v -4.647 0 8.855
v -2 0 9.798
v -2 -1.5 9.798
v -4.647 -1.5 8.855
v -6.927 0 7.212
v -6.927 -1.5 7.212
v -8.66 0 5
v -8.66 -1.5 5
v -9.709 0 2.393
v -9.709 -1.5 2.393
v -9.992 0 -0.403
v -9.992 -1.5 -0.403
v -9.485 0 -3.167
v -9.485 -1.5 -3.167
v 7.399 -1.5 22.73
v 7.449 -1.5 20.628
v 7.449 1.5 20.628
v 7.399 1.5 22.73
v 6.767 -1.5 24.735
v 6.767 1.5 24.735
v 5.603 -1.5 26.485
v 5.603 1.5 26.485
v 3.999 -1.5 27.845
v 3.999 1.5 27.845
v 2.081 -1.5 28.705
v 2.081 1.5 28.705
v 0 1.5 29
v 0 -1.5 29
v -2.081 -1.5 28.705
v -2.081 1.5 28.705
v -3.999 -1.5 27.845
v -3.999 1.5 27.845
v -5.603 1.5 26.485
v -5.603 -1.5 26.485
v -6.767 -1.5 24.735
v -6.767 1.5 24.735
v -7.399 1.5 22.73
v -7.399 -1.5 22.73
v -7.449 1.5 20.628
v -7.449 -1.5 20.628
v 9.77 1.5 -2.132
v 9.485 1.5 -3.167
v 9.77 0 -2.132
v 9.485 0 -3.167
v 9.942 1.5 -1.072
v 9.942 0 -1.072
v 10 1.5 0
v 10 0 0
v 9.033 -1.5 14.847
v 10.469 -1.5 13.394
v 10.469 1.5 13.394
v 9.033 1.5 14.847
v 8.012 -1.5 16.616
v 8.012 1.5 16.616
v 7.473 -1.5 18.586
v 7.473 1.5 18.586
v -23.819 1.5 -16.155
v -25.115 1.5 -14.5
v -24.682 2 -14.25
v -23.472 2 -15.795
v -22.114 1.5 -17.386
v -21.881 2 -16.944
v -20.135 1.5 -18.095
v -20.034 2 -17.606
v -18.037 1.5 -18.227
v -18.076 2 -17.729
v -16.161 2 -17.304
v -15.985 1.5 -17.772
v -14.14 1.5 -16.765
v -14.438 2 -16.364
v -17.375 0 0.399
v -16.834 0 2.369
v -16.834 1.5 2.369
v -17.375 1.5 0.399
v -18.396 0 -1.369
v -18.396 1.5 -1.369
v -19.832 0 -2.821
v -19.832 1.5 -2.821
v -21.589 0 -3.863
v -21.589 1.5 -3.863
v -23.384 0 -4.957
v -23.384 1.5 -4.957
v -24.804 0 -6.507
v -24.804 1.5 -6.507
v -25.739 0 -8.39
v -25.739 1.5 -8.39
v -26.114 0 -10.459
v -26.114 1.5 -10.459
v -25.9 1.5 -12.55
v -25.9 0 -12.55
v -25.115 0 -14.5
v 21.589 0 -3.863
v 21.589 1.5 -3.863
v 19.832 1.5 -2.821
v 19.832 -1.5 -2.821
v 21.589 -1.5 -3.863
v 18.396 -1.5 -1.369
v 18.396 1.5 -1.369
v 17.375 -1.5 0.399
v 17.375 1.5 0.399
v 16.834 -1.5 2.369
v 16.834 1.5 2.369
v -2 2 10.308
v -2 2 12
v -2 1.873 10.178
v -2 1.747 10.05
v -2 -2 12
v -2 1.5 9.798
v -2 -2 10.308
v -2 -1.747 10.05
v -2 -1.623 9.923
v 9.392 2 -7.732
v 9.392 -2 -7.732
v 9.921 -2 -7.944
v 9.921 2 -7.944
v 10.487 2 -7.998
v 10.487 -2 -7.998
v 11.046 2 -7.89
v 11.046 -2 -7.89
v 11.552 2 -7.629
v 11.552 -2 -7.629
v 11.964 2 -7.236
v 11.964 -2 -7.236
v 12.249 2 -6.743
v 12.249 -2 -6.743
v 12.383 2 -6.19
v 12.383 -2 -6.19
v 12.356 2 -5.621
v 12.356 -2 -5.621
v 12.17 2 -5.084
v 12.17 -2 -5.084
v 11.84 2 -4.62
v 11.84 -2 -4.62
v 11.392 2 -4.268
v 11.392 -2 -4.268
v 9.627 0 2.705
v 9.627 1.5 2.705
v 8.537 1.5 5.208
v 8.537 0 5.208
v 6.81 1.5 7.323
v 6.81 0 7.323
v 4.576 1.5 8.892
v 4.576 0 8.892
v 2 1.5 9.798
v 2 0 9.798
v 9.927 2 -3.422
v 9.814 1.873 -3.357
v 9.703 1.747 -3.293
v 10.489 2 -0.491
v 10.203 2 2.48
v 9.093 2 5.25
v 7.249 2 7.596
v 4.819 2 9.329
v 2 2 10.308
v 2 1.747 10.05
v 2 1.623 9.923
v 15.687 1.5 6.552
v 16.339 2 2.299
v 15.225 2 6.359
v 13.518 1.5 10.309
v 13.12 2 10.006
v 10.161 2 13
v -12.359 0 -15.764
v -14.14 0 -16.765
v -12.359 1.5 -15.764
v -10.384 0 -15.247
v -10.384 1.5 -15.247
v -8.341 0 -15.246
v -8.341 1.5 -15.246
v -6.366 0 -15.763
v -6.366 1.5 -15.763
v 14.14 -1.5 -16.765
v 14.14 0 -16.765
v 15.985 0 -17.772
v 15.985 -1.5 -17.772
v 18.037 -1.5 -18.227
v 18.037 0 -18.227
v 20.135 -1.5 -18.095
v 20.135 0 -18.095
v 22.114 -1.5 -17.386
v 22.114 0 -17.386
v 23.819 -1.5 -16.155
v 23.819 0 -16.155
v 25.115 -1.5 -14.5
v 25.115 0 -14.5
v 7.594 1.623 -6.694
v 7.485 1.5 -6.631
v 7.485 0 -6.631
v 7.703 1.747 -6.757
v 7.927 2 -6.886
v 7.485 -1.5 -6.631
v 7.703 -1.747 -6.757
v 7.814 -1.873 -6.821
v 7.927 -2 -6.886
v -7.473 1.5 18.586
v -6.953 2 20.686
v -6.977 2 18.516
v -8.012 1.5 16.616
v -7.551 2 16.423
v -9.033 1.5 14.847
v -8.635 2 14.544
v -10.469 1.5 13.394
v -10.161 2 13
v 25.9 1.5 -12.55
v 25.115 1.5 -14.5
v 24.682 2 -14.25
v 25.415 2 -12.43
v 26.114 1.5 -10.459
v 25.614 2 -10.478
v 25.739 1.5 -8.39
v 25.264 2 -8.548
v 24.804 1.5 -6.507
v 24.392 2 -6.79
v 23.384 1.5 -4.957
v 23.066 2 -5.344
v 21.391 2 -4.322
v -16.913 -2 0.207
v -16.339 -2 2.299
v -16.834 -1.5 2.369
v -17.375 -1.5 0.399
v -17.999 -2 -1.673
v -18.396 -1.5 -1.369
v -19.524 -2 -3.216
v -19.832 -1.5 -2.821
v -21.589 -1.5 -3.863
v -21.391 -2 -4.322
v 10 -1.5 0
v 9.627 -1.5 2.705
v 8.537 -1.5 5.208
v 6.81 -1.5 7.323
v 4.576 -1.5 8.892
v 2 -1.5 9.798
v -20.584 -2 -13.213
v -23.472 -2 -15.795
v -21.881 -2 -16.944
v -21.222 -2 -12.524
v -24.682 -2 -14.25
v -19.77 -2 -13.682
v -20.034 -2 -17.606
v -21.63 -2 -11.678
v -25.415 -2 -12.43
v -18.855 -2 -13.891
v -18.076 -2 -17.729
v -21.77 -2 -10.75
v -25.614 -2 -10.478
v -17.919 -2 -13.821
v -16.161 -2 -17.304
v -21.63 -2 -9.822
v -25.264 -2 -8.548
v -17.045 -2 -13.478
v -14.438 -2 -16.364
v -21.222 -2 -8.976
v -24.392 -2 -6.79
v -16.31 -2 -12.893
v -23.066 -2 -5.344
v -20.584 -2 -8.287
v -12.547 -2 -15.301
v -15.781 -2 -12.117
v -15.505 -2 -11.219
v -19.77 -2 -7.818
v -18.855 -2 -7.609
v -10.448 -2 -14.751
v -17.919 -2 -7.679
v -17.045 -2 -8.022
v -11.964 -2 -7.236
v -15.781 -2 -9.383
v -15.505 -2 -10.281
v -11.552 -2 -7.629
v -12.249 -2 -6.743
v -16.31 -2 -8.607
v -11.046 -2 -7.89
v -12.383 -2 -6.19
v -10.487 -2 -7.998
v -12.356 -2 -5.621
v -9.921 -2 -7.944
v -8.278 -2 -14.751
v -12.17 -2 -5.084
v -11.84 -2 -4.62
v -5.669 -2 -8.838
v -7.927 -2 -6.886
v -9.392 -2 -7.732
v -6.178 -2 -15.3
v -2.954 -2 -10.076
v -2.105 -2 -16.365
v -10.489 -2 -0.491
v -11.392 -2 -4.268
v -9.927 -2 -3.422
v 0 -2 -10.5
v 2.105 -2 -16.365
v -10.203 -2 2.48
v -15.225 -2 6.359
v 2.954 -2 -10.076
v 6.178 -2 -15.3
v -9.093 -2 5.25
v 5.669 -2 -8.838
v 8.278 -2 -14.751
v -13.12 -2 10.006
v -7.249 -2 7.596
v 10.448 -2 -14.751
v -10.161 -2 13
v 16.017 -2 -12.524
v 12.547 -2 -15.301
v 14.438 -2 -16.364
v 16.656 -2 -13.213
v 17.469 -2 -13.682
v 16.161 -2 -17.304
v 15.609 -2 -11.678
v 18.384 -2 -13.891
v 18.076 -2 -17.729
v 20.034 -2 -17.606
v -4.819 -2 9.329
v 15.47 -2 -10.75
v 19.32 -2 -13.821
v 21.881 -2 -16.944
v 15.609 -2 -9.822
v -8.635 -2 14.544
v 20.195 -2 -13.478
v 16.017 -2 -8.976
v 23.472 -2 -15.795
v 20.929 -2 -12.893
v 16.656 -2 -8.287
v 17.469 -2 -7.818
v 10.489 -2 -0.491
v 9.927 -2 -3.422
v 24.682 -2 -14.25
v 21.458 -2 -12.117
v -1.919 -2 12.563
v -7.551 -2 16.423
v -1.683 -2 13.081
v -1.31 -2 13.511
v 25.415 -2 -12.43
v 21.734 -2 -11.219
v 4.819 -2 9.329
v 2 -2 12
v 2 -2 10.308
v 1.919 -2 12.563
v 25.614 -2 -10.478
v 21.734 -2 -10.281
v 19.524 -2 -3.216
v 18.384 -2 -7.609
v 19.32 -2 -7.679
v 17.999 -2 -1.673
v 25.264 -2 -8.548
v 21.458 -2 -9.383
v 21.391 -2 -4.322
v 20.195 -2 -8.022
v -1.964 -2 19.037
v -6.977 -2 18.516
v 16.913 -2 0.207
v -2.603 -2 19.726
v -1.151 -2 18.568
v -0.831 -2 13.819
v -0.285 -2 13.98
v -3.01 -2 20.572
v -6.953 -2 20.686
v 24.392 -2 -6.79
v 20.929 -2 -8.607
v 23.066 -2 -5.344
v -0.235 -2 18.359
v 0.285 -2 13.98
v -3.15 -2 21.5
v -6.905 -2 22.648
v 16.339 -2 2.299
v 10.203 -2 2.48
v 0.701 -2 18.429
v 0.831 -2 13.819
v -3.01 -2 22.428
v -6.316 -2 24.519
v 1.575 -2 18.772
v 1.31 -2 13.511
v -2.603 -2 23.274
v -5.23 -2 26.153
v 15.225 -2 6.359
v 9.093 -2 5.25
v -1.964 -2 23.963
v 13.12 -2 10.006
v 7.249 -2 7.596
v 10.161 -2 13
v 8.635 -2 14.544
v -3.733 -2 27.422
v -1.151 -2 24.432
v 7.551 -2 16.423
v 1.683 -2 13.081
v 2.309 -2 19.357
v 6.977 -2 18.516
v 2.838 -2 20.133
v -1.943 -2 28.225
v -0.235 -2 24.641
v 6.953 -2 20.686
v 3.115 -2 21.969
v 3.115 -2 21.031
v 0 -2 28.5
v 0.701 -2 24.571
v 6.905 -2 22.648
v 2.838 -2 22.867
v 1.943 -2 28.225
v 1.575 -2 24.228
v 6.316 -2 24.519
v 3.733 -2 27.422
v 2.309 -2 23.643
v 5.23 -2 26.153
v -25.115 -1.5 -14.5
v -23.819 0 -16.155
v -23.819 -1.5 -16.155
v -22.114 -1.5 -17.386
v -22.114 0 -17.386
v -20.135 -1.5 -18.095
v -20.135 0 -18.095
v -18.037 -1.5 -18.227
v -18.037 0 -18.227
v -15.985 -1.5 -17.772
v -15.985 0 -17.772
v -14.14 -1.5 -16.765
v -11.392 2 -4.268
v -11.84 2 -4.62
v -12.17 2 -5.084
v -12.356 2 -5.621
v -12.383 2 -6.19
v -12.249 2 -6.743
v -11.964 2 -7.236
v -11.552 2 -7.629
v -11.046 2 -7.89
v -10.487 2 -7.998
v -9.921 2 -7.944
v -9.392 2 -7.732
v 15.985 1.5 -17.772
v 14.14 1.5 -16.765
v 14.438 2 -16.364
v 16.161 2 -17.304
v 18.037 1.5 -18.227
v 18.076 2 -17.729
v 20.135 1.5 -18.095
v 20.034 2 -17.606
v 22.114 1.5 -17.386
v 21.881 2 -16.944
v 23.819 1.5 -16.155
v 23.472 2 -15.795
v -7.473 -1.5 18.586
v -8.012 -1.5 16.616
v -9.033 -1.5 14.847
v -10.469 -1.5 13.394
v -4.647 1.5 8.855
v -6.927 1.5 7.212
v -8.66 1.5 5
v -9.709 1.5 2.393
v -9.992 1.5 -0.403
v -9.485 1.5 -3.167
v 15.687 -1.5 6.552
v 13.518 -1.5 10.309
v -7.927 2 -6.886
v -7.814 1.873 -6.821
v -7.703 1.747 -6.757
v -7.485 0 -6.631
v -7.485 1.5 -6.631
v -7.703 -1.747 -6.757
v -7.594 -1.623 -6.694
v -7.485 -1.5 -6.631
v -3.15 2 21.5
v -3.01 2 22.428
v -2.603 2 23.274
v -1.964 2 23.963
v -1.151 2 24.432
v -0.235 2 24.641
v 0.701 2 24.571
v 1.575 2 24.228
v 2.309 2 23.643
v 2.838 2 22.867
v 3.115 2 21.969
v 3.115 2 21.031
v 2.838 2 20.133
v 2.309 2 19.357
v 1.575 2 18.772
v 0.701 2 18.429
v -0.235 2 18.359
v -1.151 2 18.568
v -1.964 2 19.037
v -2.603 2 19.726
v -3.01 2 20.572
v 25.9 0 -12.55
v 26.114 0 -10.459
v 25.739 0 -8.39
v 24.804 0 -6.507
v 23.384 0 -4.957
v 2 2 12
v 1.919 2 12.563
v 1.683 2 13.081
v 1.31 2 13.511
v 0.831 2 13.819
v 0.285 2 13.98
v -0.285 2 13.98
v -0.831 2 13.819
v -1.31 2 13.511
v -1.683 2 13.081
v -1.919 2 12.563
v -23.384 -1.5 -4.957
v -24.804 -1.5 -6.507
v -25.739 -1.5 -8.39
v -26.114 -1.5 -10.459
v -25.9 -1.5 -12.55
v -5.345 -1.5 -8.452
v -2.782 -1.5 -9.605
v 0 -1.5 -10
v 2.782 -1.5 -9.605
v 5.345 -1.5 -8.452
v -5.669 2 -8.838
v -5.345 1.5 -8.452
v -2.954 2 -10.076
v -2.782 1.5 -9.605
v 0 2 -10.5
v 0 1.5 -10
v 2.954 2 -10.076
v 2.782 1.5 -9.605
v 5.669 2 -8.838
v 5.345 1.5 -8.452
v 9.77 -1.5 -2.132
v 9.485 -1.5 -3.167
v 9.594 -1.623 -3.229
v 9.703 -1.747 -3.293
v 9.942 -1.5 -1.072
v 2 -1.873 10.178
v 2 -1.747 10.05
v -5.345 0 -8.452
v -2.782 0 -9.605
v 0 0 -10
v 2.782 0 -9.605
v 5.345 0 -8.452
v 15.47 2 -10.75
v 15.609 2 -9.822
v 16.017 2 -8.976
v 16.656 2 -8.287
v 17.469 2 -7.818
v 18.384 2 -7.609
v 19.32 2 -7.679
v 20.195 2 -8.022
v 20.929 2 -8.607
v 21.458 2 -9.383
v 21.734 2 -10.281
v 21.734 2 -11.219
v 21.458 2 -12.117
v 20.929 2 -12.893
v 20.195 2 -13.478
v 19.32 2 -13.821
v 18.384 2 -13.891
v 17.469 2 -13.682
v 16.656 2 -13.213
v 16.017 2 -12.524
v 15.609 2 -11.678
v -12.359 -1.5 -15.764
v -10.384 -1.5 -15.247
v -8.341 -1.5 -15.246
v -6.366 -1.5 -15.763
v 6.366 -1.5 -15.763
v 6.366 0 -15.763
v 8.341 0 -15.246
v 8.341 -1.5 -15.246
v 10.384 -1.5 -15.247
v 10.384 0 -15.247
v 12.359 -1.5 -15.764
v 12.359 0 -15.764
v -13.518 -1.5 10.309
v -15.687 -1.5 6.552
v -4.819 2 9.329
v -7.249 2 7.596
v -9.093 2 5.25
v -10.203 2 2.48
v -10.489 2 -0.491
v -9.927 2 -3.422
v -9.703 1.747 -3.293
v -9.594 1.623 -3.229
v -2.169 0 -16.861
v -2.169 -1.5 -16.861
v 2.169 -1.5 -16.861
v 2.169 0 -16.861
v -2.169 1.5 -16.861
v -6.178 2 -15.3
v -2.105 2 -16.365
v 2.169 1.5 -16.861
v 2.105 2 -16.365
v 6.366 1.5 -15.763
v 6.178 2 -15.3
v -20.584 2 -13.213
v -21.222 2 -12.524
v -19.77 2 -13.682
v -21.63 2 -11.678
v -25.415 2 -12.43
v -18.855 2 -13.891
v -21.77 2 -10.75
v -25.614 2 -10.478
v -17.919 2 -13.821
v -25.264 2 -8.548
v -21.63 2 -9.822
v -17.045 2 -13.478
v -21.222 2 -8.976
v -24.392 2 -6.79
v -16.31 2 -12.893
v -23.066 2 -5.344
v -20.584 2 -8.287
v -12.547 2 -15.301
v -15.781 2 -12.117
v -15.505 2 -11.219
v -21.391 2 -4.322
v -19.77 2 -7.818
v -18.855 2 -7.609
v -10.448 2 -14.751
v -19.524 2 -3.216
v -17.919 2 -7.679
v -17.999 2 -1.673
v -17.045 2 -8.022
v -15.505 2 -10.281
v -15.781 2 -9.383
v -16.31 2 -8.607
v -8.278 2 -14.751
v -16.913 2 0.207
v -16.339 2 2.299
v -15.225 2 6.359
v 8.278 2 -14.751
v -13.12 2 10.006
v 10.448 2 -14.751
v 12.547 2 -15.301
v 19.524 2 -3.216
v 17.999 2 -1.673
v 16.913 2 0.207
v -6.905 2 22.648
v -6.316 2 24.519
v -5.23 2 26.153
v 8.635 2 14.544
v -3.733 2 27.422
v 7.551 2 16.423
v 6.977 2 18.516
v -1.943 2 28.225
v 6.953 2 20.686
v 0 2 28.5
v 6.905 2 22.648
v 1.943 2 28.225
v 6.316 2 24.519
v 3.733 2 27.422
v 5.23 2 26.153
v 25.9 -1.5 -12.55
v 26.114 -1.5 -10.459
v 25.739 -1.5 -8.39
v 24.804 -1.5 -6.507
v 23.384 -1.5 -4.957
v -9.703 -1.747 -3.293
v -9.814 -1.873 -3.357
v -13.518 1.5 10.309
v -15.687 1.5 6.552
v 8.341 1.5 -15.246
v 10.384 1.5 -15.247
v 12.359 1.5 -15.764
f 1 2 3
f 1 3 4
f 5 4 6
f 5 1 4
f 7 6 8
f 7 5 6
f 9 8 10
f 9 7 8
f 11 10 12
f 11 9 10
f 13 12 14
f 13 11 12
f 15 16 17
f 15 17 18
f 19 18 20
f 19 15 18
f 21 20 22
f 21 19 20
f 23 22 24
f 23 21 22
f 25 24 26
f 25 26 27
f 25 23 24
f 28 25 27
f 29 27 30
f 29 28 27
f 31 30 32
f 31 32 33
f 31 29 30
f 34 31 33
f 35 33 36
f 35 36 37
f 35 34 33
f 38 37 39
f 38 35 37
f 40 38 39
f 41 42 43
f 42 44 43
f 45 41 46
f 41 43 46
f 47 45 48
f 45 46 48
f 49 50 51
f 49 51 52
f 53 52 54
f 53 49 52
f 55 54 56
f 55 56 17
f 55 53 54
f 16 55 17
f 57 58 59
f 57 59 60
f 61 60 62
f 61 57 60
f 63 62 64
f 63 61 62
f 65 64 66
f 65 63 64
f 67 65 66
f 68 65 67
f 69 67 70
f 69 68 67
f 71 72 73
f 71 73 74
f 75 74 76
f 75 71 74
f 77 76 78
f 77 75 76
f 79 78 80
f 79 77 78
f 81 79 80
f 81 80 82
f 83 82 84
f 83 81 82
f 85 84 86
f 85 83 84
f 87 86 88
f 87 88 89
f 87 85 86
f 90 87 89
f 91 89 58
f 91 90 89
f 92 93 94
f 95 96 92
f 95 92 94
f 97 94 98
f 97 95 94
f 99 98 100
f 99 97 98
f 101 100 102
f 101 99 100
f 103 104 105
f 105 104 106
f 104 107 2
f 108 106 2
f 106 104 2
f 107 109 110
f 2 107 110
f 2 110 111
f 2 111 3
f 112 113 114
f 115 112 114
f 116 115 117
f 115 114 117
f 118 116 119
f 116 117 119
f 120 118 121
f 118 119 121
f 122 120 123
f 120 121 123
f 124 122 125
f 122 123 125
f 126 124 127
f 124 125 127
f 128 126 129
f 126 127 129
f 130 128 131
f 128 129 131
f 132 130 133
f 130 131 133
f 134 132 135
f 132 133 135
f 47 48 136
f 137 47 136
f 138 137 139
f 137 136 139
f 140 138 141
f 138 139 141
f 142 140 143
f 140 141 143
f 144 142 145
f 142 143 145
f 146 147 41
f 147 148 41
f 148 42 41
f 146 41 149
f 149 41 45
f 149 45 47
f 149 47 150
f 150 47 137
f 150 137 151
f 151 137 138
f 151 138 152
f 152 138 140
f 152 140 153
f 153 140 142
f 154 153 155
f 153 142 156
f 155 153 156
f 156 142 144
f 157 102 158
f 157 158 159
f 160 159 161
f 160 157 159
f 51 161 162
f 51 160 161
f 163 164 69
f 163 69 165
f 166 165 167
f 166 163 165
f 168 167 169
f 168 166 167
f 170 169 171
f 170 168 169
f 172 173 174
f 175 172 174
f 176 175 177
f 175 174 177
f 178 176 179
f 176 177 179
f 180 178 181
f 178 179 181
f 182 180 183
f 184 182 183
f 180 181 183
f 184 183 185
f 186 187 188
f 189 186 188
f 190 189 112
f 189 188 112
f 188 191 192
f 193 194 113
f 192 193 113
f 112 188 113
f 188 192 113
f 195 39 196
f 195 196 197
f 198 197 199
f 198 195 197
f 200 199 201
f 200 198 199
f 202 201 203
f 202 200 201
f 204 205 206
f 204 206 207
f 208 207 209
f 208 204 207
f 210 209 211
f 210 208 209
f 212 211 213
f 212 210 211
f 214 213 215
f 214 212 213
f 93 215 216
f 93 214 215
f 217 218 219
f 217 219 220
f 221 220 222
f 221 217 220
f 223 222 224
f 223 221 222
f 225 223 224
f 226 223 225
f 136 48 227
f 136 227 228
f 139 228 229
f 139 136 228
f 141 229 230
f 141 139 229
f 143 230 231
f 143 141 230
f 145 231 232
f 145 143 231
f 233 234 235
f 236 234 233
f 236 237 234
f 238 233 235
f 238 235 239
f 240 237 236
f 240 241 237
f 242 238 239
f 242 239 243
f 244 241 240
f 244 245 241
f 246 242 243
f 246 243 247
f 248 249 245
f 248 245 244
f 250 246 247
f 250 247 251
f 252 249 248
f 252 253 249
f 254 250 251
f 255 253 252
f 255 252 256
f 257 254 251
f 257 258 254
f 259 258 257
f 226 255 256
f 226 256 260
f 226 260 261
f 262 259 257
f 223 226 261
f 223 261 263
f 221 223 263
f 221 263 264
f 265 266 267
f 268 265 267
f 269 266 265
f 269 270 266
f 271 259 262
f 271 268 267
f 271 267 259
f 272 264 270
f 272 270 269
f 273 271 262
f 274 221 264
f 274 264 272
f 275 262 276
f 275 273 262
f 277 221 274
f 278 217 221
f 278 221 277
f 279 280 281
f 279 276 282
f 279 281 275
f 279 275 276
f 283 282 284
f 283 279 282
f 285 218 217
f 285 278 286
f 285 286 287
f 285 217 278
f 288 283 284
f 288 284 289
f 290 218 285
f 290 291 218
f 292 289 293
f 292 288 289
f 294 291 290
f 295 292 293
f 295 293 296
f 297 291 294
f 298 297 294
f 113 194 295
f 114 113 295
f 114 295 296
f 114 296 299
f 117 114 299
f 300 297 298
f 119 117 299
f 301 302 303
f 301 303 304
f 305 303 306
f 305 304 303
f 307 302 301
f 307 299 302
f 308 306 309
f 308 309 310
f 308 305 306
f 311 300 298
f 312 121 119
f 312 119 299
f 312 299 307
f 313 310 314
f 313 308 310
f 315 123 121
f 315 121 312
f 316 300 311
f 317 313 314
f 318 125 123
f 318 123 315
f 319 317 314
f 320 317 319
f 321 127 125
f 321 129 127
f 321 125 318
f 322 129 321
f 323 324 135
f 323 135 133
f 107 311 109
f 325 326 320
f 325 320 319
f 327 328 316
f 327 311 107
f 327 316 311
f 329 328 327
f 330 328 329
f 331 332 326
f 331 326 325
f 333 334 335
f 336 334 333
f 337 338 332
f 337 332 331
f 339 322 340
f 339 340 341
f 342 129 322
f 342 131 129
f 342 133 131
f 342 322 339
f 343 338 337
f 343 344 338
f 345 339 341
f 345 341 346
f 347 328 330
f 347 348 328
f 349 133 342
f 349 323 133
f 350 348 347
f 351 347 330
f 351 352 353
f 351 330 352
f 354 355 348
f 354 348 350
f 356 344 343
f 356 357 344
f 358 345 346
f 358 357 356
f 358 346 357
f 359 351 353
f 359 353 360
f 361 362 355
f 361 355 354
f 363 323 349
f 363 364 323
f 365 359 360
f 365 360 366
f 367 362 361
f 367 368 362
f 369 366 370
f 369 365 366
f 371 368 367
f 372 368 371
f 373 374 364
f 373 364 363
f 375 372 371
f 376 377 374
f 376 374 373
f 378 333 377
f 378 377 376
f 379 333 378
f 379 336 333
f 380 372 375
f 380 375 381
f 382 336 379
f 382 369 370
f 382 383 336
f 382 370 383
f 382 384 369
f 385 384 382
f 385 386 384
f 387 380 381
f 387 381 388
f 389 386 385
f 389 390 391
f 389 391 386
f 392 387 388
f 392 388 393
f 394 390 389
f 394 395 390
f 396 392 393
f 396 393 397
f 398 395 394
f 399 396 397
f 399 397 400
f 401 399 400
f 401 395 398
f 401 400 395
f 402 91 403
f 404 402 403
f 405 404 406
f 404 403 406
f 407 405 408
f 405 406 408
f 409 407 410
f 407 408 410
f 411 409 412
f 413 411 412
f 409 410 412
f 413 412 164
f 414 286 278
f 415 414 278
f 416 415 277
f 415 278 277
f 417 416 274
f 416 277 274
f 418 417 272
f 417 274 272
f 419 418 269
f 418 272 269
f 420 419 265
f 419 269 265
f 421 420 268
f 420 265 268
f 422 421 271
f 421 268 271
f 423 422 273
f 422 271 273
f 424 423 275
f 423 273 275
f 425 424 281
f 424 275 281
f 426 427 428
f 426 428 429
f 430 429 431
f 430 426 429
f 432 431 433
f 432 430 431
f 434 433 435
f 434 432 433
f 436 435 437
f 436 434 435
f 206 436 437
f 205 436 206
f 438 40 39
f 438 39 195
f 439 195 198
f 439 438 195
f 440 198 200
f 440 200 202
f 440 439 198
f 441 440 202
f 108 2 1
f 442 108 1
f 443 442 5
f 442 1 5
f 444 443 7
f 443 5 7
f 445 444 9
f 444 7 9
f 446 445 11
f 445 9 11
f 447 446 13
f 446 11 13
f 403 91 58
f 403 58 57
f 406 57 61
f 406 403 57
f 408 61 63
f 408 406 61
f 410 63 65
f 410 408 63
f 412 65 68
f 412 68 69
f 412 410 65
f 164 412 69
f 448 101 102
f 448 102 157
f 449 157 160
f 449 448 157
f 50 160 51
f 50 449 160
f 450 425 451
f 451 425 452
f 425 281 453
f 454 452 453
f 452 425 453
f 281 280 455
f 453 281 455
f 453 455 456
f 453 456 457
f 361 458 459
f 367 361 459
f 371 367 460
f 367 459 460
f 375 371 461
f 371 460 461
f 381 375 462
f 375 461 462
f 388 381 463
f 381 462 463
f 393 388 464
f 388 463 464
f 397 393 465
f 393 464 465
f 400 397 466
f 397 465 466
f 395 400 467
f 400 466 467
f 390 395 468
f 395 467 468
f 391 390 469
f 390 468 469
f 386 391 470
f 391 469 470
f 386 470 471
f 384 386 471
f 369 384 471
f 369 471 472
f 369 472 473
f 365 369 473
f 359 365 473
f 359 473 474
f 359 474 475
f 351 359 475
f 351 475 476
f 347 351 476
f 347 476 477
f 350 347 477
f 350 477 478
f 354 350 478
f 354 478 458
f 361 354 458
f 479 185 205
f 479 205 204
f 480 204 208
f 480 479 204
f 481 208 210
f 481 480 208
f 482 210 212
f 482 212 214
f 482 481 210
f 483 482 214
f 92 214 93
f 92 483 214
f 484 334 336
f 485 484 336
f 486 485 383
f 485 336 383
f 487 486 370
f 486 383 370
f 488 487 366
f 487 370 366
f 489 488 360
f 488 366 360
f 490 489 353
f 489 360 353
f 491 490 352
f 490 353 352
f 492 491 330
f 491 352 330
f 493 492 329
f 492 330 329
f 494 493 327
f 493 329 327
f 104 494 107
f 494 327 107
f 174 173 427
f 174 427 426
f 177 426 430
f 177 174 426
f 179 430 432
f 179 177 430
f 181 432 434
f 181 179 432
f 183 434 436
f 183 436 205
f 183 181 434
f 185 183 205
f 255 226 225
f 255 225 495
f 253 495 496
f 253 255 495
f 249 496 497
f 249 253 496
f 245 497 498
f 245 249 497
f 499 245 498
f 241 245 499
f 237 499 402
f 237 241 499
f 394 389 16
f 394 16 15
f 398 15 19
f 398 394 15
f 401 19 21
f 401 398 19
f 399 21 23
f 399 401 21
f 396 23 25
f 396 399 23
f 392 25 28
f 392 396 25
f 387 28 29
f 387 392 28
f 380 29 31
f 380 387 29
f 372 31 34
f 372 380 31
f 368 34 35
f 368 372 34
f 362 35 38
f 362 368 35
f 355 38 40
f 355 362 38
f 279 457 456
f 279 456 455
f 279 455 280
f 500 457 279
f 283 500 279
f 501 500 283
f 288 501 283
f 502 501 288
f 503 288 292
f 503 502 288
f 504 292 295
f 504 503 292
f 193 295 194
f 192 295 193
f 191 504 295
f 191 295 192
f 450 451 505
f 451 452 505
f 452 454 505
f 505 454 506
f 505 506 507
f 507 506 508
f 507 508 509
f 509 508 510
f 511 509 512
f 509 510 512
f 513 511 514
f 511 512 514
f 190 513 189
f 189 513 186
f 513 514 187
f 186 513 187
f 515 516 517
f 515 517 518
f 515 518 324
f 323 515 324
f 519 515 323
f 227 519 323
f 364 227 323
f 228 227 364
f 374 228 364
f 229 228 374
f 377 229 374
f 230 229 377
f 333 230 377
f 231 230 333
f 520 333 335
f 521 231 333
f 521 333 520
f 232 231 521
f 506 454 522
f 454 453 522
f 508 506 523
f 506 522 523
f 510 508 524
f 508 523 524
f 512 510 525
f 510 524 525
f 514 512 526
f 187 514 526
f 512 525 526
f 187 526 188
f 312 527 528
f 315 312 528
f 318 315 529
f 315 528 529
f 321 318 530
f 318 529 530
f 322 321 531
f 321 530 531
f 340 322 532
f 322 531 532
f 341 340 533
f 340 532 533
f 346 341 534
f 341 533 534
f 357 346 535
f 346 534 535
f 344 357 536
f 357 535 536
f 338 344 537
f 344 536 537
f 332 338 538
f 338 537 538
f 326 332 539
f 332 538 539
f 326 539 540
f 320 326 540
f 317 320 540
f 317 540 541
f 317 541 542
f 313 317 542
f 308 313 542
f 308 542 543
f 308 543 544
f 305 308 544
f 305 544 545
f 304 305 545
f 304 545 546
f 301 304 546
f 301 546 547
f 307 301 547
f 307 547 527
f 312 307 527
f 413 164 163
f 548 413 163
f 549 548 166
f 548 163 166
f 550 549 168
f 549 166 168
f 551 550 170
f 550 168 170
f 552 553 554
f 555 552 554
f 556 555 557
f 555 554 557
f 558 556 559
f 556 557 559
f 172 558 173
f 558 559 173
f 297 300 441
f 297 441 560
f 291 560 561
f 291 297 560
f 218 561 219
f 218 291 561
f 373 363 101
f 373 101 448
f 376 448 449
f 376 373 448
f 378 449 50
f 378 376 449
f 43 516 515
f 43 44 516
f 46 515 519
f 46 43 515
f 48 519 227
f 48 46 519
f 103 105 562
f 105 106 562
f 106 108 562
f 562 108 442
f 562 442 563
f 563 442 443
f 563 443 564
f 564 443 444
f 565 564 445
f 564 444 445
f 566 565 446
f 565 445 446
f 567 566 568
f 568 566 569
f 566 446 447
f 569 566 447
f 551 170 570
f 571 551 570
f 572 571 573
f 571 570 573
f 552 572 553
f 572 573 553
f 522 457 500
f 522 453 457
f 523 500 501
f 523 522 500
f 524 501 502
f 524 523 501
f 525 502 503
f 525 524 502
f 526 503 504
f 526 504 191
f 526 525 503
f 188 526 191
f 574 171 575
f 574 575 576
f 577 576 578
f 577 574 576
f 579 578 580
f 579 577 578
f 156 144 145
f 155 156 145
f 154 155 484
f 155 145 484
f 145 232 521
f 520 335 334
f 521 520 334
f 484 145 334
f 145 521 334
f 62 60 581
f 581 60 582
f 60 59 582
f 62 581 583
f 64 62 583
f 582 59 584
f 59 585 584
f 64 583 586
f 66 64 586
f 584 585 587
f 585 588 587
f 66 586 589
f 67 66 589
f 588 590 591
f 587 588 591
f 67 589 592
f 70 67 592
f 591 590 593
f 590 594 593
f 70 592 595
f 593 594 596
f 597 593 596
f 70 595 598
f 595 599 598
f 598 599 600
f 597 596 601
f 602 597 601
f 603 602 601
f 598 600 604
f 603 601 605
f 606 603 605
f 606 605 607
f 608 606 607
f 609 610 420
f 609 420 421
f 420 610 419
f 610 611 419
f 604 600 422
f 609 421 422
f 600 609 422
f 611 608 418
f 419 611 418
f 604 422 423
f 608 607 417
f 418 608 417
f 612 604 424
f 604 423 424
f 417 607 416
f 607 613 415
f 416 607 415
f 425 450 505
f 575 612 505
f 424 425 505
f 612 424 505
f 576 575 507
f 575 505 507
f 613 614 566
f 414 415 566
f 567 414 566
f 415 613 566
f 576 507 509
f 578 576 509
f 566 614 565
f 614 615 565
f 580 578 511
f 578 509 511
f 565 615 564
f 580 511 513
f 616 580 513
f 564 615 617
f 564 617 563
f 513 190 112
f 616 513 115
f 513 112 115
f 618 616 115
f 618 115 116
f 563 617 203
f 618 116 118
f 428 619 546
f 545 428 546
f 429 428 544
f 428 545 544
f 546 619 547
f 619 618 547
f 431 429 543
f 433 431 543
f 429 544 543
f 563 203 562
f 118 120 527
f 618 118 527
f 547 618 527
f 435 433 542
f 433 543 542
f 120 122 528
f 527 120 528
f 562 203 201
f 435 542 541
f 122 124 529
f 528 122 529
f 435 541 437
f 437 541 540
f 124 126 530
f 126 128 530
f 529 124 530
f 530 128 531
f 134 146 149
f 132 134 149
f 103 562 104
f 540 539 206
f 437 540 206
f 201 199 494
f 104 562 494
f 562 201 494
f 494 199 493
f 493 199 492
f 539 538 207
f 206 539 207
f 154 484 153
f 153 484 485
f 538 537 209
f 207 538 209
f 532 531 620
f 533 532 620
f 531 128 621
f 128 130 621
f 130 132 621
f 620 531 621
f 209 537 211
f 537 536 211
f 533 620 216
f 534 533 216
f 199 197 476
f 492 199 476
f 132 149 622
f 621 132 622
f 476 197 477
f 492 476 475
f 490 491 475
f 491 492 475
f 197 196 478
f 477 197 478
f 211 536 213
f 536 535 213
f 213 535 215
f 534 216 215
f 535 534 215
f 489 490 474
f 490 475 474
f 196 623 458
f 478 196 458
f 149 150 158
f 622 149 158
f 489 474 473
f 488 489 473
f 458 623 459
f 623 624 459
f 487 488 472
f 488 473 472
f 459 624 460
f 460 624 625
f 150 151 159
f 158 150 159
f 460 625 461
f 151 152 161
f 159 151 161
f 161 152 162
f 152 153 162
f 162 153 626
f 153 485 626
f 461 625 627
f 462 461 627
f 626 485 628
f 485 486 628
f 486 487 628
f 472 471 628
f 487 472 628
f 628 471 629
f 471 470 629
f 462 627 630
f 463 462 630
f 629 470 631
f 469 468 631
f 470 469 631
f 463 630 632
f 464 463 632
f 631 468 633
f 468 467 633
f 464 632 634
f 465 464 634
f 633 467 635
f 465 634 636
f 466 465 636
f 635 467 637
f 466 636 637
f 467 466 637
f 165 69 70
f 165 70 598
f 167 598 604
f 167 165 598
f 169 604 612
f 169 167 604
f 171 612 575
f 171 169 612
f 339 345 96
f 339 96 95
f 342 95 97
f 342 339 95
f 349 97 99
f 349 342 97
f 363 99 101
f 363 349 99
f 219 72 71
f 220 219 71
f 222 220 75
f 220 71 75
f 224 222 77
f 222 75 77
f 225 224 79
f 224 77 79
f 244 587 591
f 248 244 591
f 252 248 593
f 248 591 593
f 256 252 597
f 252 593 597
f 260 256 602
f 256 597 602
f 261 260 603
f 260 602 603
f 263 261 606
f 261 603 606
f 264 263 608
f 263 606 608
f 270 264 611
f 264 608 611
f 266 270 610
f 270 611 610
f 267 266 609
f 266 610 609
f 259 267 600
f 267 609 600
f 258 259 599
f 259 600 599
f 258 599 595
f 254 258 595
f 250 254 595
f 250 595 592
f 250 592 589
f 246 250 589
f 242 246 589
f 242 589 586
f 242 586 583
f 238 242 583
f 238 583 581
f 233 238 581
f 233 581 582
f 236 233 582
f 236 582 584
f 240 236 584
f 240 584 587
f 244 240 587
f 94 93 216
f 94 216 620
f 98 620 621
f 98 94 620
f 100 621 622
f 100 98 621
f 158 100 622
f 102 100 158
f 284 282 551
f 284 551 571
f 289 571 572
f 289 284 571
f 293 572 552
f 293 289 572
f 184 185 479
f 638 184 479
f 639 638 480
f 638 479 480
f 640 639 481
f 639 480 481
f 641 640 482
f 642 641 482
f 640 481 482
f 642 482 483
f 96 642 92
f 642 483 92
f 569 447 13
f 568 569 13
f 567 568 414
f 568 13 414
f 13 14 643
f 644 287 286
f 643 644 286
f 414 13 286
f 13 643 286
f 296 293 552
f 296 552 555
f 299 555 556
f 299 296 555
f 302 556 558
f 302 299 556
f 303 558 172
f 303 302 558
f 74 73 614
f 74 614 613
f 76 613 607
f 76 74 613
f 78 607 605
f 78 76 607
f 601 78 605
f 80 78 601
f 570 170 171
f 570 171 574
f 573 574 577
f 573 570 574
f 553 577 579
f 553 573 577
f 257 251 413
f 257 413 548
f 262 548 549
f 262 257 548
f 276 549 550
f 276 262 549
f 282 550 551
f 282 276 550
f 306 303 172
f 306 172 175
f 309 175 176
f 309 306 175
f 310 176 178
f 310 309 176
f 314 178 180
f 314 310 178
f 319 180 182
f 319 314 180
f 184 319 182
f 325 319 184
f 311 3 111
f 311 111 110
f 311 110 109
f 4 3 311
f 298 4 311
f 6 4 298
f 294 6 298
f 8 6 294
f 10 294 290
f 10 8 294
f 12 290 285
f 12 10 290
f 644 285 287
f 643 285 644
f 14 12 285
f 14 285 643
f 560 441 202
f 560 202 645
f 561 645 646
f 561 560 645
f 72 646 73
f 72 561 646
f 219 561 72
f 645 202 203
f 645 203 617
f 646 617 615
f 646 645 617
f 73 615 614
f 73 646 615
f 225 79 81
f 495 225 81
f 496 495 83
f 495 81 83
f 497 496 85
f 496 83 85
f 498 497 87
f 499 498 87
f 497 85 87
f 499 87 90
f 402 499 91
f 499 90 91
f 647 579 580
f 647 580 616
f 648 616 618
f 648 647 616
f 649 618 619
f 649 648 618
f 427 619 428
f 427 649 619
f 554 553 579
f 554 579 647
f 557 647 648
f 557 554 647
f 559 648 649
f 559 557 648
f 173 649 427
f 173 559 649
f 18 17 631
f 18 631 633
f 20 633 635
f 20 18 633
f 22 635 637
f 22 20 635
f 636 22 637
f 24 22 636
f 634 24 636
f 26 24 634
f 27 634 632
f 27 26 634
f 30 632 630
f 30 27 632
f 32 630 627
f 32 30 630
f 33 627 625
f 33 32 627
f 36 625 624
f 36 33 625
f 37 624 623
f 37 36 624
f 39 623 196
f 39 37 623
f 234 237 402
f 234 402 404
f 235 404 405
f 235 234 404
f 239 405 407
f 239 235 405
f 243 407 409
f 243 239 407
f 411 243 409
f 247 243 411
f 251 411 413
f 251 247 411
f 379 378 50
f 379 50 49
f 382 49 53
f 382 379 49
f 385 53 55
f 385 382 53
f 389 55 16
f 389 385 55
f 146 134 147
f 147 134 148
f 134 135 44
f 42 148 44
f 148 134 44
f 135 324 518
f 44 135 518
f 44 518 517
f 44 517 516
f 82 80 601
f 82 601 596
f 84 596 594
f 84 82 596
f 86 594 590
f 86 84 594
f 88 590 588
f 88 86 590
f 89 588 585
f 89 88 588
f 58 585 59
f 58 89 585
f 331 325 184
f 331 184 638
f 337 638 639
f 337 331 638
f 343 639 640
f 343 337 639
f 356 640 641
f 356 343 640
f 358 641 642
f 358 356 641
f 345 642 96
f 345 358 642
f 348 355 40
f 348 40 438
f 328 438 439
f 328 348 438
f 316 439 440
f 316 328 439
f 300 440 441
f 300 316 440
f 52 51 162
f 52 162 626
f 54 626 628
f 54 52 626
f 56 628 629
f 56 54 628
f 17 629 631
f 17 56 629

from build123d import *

# Parameters (mm, degrees)
F0_R          = 10
F1_DEPTH      = 2
F1_DEPTH_BACK = 2
F3_D          = 6.3
F4_SIZE       = 0.5
F6_DEPTH      = 4.001


with BuildPart() as f1:
    # F0 (on Front) → F1 (new body, two sides)
    with BuildSketch(Plane.XZ) as f1_sk:
        with BuildLine():
            ThreePointArc((10.4685027699, 13.3944186047), (8.0122088596, 16.6160342353), (7.4491243619, 20.6279069767))
            ThreePointArc((7.4491243619, 20.6279069767), (5.6031552573, 26.4854439284), (0, 29))
            ThreePointArc((0, 29), (-5.6031552573, 26.4854439284), (-7.4491243619, 20.6279069767))
            ThreePointArc((-7.4491243619, 20.6279069767), (-8.0122088596, 16.6160342353), (-10.4685027699, 13.3944186047))
            ThreePointArc((-10.4685027699, 13.3944186047), (-14.7224318643, 8.5), (-16.8341581655, 2.368780036))
            ThreePointArc((-16.8341581655, 2.368780036), (-18.3960121877, -1.3692407048), (-21.5888536497, -3.862822555))
            ThreePointArc((-21.5888536497, -3.862822555), (-25.7386449011, -8.39024717), (-25.1147367097, -14.5))
            ThreePointArc((-25.1147367097, -14.5), (-20.1354896438, -18.0951967583), (-14.1397292878, -16.7650844217))
            ThreePointArc((-14.1397292878, -16.7650844217), (-10.3838033281, -15.2467935304), (-6.3656553956, -15.7631986406))
            ThreePointArc((-6.3656553956, -15.7631986406), (0, -17), (6.3656553956, -15.7631986406))
            ThreePointArc((6.3656553956, -15.7631986406), (10.3838033281, -15.2467935304), (14.1397292878, -16.7650844217))
            ThreePointArc((14.1397292878, -16.7650844217), (20.1354896438, -18.0951967583), (25.1147367097, -14.5))
            ThreePointArc((25.1147367097, -14.5), (25.7386449011, -8.39024717), (21.5888536497, -3.862822555))
            ThreePointArc((21.5888536497, -3.862822555), (18.3960121877, -1.3692407048), (16.8341581655, 2.368780036))
            ThreePointArc((16.8341581655, 2.368780036), (14.7224318643, 8.5), (10.4685027699, 13.3944186047))
        make_face()
        Circle(F0_R, mode=Mode.SUBTRACT)
    extrude(amount=F1_DEPTH)
    extrude(f1_sk.sketch, amount=-F1_DEPTH_BACK)

    # F3 (through all)
    with Locations(Plane.XZ.offset(2)):
        with Locations((0, 21.5), (-18.6195461814, -10.75), (18.6195461814, -10.75)):
            Hole(F3_D / 2)

    # F4
    f4_edges = [f1.edges().sort_by_distance(p)[0] for p in [
        (-10, -2, 0),
        (-10, 2, 0),
        (0, -2, 29),
        (0, 2, 29),
    ]]
    chamfer(f4_edges, length=F4_SIZE)

    # F5 (on face) → F6 (cut, through all)
    with BuildSketch(Plane.XZ.offset(2)):
        with BuildLine():
            ThreePointArc((-2, 9.7979589711), (0, 10), (2, 9.7979589711))
            Line((2, 9.7979589711), (2, 12))
            ThreePointArc((2, 12), (0, 14), (-2, 12))
            Line((-2, 12), (-2, 9.7979589711))
        make_face()
        with BuildLine():
            Line((-9.4852813742, -3.166928678), (-11.3923048454, -4.2679491924))
            ThreePointArc((-11.3923048454, -4.2679491924), (-12.124355653, -7), (-9.3923048454, -7.7320508076))
            Line((-9.3923048454, -7.7320508076), (-7.4852813742, -6.6310302931))
            ThreePointArc((-7.4852813742, -6.6310302931), (-8.6602540378, -5), (-9.4852813742, -3.166928678))
        make_face()
        with BuildLine():
            Line((7.4852813742, -6.6310302931), (9.3923048454, -7.7320508076))
            ThreePointArc((9.3923048454, -7.7320508076), (12.124355653, -7), (11.3923048454, -4.2679491924))
            Line((11.3923048454, -4.2679491924), (9.4852813742, -3.166928678))
            ThreePointArc((9.4852813742, -3.166928678), (8.6602540378, -5), (7.4852813742, -6.6310302931))
        make_face()
    extrude(amount=-F6_DEPTH, mode=Mode.SUBTRACT)


solid = f1.part
